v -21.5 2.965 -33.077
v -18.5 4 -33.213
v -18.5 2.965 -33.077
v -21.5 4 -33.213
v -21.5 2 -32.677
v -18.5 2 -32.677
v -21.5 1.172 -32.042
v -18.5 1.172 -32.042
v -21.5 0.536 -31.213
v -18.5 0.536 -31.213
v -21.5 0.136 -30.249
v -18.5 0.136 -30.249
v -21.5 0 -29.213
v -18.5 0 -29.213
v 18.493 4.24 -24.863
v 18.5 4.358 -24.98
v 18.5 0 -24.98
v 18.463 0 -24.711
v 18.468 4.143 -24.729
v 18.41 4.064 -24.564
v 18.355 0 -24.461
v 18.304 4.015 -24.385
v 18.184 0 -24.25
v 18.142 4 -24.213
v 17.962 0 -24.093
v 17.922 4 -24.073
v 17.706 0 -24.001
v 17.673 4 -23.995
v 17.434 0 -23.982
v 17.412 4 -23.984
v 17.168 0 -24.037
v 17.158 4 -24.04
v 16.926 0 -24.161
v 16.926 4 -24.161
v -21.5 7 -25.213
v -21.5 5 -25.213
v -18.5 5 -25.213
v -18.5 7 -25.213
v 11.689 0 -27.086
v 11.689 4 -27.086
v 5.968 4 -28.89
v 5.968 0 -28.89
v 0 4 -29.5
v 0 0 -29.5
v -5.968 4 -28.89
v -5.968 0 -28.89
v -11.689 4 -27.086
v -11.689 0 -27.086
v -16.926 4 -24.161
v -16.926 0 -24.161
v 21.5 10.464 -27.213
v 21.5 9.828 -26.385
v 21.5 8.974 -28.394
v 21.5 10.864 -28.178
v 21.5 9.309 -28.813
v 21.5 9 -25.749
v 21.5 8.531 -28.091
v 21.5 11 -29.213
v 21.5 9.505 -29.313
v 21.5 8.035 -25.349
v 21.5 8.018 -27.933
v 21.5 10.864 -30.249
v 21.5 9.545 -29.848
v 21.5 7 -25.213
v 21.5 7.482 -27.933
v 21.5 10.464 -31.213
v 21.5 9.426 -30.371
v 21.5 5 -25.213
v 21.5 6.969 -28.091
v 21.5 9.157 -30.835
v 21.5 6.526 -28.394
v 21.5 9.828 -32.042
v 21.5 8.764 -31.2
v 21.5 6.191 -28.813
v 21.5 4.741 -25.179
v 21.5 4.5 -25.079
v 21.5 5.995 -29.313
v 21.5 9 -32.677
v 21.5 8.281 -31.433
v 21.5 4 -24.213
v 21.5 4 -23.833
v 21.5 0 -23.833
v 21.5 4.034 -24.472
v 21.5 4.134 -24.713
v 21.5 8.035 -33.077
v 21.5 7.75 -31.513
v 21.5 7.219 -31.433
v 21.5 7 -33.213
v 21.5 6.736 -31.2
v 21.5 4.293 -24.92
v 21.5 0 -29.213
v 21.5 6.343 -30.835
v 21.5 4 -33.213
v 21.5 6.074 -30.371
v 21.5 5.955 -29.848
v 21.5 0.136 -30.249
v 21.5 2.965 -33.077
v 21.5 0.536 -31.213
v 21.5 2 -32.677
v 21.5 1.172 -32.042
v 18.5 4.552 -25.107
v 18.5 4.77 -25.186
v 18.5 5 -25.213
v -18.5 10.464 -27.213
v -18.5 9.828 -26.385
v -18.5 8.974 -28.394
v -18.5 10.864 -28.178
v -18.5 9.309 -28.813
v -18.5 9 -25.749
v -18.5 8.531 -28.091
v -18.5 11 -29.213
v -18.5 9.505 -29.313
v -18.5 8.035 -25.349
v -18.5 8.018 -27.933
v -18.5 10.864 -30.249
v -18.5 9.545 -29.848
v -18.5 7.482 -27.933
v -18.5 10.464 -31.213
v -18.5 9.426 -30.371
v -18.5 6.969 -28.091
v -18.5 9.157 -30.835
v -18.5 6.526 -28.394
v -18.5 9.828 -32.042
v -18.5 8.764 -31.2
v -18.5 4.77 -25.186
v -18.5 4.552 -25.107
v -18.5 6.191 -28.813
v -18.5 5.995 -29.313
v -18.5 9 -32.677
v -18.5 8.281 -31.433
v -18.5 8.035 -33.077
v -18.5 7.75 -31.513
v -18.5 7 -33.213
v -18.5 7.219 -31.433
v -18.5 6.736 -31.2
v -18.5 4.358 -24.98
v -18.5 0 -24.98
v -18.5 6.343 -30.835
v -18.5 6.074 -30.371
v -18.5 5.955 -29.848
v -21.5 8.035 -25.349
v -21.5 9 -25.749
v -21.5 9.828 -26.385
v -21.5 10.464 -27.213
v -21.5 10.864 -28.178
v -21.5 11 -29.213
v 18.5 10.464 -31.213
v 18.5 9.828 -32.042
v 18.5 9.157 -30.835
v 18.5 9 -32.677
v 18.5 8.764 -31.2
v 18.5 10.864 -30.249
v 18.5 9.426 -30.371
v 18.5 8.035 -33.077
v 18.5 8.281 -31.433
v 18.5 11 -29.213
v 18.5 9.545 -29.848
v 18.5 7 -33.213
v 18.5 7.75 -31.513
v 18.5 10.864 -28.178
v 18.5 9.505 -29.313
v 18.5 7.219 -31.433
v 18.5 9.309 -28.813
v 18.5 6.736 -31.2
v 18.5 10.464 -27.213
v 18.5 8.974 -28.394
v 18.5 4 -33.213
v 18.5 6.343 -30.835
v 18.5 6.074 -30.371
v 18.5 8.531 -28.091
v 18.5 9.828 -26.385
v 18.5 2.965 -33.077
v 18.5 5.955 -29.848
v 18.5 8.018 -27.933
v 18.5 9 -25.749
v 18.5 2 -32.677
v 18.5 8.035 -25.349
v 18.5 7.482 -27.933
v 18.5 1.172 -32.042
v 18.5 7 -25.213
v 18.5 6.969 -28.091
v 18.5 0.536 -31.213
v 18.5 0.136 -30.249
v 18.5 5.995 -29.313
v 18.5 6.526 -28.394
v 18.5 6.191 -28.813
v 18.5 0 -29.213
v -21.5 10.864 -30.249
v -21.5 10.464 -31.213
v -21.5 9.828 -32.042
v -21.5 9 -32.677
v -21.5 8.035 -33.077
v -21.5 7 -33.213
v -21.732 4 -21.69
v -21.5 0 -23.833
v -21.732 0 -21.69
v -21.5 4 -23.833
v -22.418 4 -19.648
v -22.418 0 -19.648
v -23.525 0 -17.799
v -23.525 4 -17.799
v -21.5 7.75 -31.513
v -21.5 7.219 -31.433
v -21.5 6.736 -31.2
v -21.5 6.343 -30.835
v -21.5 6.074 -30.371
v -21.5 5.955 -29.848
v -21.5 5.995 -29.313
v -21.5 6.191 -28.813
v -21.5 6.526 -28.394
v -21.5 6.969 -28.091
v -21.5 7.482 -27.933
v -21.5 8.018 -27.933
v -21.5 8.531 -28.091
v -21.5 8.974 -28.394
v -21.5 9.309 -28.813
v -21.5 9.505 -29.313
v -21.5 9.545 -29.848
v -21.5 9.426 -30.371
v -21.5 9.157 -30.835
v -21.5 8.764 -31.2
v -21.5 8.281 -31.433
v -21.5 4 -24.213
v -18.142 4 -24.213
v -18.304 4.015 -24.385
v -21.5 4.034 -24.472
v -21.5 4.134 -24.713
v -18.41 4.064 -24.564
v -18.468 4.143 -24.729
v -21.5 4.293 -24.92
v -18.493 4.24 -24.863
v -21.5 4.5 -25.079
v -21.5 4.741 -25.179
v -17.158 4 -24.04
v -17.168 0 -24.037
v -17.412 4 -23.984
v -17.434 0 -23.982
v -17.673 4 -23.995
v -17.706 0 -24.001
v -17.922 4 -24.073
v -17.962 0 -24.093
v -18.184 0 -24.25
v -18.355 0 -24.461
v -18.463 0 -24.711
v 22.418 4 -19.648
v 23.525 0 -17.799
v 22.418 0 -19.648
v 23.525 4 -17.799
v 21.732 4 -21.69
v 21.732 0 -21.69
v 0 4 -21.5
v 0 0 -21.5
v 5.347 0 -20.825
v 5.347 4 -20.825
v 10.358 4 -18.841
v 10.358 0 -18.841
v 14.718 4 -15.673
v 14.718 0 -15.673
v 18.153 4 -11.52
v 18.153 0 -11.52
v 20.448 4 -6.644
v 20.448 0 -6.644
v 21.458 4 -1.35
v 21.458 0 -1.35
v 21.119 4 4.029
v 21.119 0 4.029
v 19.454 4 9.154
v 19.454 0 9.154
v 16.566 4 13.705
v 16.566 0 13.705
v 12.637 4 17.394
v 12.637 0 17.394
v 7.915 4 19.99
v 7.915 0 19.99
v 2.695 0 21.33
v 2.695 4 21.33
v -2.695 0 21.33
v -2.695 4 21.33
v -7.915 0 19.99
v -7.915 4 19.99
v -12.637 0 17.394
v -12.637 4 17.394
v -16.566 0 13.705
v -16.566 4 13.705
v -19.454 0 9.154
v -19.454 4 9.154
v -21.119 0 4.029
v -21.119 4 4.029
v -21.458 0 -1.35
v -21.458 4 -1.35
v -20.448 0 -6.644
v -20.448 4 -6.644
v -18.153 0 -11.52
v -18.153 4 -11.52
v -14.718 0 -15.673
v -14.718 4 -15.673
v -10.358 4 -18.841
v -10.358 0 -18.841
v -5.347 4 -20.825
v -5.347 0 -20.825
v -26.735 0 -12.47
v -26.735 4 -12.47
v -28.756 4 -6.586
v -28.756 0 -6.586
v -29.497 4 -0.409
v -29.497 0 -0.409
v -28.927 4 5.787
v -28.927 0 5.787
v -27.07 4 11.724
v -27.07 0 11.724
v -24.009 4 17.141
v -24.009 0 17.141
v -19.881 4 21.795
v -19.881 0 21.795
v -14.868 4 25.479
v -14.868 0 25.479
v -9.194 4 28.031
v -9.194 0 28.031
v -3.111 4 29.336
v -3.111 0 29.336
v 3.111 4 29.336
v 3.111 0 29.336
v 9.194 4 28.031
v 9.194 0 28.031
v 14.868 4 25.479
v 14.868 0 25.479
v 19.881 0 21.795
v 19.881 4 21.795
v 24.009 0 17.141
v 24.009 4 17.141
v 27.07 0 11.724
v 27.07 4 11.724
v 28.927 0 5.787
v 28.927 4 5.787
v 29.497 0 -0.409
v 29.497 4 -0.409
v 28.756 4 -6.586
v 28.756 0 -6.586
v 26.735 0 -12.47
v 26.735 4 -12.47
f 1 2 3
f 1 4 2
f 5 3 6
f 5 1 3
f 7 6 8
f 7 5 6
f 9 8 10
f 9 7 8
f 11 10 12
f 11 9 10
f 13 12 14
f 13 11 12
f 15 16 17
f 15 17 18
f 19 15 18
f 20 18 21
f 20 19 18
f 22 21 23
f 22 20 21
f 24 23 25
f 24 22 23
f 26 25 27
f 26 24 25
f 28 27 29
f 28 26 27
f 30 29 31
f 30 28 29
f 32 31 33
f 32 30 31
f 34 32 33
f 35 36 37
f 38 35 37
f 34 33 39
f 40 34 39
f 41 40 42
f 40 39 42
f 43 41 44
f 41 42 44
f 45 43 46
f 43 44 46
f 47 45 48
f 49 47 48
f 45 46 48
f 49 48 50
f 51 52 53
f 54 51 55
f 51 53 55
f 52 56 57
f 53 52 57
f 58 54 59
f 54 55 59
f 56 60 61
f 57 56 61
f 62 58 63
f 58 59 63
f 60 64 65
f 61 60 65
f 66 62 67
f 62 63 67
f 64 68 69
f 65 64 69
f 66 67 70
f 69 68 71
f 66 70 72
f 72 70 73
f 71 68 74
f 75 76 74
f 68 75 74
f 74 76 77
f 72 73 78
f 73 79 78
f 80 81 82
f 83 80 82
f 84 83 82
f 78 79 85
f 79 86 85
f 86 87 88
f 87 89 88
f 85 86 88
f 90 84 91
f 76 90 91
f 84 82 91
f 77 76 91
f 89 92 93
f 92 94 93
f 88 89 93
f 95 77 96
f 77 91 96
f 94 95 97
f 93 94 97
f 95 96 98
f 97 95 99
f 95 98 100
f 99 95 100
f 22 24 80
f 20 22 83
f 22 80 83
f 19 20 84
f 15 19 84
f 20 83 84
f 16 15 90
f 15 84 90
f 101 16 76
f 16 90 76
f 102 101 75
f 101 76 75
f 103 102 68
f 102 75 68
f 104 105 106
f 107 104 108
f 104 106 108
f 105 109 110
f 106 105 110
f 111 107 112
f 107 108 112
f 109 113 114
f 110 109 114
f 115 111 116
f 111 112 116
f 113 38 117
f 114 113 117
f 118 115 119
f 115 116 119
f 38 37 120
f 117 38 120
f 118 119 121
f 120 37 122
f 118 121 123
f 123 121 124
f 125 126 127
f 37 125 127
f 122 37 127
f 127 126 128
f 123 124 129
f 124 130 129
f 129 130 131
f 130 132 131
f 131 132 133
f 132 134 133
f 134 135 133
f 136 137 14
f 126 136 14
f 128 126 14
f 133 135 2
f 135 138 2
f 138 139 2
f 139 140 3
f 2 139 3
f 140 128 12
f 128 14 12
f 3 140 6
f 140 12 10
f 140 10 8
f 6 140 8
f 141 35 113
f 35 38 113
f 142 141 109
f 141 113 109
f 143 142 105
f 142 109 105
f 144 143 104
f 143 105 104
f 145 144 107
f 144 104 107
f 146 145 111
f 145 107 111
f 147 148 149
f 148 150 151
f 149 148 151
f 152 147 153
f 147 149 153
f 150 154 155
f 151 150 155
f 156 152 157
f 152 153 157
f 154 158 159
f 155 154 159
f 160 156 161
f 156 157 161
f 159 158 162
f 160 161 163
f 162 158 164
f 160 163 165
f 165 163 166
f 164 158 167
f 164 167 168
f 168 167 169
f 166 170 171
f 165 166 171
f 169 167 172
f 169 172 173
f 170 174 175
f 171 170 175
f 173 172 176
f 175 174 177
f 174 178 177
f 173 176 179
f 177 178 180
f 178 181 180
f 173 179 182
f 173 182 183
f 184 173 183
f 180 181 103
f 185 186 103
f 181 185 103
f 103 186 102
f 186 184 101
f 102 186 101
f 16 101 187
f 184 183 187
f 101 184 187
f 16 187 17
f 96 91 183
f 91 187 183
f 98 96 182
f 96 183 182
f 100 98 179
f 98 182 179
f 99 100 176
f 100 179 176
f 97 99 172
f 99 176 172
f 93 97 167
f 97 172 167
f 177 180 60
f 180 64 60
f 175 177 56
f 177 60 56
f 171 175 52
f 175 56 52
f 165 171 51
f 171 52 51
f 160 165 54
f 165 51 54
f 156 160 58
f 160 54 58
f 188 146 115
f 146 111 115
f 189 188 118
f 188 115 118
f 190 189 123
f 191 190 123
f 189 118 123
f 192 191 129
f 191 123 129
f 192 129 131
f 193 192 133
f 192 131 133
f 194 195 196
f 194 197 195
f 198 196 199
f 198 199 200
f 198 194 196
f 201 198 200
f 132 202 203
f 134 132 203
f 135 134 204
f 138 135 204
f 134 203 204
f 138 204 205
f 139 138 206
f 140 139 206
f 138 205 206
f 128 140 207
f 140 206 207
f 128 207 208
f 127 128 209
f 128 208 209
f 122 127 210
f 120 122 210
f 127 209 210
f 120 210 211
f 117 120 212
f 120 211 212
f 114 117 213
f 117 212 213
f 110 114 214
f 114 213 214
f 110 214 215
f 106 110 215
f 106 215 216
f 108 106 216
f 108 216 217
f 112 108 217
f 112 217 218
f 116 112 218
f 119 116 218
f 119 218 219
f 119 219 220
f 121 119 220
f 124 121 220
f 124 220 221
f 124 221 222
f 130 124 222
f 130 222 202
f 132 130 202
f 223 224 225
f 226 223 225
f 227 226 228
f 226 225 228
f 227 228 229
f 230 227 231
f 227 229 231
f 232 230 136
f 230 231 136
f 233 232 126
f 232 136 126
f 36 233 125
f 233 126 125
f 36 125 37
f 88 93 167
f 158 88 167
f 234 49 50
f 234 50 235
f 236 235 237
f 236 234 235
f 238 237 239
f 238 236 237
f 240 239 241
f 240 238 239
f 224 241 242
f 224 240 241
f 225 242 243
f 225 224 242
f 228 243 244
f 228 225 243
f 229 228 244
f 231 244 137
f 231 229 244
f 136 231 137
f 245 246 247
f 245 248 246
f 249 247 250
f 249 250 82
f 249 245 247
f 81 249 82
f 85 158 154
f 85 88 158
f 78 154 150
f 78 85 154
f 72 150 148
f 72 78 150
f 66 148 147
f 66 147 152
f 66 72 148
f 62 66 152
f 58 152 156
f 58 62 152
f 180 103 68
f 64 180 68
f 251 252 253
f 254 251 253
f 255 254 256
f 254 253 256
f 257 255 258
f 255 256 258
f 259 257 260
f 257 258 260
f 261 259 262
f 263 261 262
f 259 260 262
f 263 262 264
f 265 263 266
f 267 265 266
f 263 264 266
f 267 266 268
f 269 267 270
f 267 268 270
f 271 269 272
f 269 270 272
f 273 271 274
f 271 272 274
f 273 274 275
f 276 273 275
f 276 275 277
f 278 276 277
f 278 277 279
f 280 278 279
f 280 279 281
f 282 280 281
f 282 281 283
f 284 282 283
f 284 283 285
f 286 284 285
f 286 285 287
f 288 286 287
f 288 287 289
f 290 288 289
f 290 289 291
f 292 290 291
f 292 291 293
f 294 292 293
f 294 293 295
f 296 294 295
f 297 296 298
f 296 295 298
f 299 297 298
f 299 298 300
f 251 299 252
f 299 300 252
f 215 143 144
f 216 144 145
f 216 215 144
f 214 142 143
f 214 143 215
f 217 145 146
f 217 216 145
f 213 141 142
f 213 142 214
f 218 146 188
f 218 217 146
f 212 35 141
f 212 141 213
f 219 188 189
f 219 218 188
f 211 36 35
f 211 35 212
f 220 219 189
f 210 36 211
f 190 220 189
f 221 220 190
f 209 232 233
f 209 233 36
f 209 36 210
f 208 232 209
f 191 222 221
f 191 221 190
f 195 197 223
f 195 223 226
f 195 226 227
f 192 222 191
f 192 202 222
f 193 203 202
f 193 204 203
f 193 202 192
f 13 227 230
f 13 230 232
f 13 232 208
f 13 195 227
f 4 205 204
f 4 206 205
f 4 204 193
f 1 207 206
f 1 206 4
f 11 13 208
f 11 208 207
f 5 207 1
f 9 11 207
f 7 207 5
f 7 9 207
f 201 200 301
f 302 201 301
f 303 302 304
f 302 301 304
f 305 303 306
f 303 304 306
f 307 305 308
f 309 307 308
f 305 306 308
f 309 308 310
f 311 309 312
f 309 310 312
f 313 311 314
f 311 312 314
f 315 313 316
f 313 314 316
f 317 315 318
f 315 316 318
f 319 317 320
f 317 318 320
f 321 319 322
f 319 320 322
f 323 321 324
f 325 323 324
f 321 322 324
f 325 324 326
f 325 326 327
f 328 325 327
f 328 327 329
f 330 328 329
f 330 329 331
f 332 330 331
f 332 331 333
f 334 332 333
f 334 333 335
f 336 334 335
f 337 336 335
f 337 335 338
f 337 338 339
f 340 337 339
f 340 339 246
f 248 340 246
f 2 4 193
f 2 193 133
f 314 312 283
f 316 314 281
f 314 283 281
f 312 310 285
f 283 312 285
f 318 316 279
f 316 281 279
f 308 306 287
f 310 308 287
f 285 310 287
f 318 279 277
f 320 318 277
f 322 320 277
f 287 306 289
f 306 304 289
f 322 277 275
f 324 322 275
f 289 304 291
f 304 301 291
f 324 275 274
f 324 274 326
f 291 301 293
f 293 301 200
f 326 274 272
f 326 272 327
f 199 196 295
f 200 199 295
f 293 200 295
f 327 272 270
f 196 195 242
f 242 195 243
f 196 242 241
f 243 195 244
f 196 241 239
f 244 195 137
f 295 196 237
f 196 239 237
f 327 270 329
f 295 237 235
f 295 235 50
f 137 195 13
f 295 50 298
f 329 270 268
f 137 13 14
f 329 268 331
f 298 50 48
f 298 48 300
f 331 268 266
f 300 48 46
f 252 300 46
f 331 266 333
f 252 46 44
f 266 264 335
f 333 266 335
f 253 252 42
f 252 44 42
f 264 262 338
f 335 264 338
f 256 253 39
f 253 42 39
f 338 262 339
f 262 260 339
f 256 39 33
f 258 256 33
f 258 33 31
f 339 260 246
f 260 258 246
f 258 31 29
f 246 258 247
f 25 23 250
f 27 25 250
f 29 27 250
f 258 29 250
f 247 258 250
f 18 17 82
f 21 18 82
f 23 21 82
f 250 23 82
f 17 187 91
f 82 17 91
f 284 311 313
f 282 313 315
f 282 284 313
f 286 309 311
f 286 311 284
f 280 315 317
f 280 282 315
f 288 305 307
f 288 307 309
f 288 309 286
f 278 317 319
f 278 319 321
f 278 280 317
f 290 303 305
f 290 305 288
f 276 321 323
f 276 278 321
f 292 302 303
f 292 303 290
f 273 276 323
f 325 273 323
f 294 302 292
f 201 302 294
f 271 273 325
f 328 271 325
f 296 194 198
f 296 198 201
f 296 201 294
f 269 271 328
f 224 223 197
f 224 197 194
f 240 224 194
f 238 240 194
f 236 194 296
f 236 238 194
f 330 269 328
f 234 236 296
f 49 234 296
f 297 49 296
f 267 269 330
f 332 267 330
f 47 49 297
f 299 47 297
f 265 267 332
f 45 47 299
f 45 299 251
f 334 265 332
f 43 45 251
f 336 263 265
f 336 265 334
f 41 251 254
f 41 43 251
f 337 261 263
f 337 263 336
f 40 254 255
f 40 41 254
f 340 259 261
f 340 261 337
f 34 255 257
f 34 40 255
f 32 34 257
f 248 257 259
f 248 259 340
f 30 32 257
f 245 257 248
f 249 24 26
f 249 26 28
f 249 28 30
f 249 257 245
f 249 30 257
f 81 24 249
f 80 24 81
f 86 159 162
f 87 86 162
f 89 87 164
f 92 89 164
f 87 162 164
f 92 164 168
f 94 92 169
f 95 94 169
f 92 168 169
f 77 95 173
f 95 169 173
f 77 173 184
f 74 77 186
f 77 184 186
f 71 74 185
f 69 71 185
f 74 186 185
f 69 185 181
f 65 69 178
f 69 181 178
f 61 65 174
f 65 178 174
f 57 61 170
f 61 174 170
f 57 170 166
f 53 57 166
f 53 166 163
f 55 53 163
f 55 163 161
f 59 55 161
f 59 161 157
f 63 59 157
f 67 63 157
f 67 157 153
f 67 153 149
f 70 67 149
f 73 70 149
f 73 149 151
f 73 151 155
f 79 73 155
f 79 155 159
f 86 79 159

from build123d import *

# Parameters (mm, degrees)
BOSS_EXTRUDE1_DEPTH = 4
SKETCH2_W           = 3
SKETCH2_H           = 8
BOSS_EXTRUDE2_DEPTH = 7
SKETCH3_R           = 1.8
CUT_EXTRUDE1_DEPTH  = 62.847529316
FILLET1_R           = 4
FILLET2_R           = 10
FILLET3_R           = 1
FILLET4_R           = 1
SKETCH4_R           = 21.5
CUT_EXTRUDE2_DEPTH  = 46.764253326


with BuildPart() as part:
    # Sketch1 → Boss-Extrude1 (new body)
    with BuildSketch(Plane(origin=(0, 0, 0), x_dir=(1, 0, 0), z_dir=(0, 1, 0))):
        with BuildLine():
            Line((18.5, 33.213203436), (18.5, 22.978250586))
            ThreePointArc((18.5, 22.978250586), (0, 29.5), (-18.5, 22.978250586))
            Line((-18.5, 22.978250586), (-18.5, 33.213203436))
            Line((-18.5, 33.213203436), (-21.5, 33.213203436))
            Line((-21.5, 33.213203436), (-21.5, 20.199009877))
            ThreePointArc((-21.5, 20.199009877), (0, -29.5), (21.5, 20.199009877))
            Line((21.5, 20.199009877), (21.5, 33.213203436))
            Line((21.5, 33.213203436), (18.5, 33.213203436))
        make_face()
    extrude(amount=BOSS_EXTRUDE1_DEPTH)

    # Sketch2 → Boss-Extrude2 (add)
    with BuildSketch(Plane(origin=(0, 4, 0), x_dir=(1, 0, 0), z_dir=(0, 1, 0))):
        with Locations((-20, 29.213203436)):
            Rectangle(SKETCH2_W, SKETCH2_H)
        with Locations((20, 29.213203436)):
            Rectangle(SKETCH2_W, SKETCH2_H)
    extrude(amount=BOSS_EXTRUDE2_DEPTH)

    # Sketch3 → Cut-Extrude1 (cut, through all)
    with BuildSketch(Plane.ZY.offset(21.5)):
        with Locations(Location((-29.713203436, 7.75, 0), (0, 0, 180))):
            Circle(SKETCH3_R)
    extrude(amount=-CUT_EXTRUDE1_DEPTH, mode=Mode.SUBTRACT)

    # Fillet1
    fillet1_edges = [part.edges().sort_by_distance(p)[0] for p in [
        (-20, 11, -25.213203436),
        (-20, 11, -33.213203436),
        (20, 11, -25.213203436),
        (20, 11, -33.213203436),
        (20, 0, -33.213203436),
        (-20, 0, -33.213203436),
    ]]
    fillet(fillet1_edges, radius=FILLET1_R - 0.0001)  # a hair under: the kernel refuses the full size

    # Fillet2
    fillet2_edges = [part.edges().sort_by_distance(p)[0] for p in [
        (21.5, 2, -20.199009877),
        (-21.5, 2, -20.199009877),
    ]]
    fillet(fillet2_edges, radius=FILLET2_R)

    # Fillet3
    fillet3_edges = [part.edges().sort_by_distance(p)[0] for p in [
        (18.5, 2, -22.978250586),
        (-18.5, 2, -22.978250586),
    ]]
    fillet(fillet3_edges, radius=FILLET3_R)

    # Fillet4
    fillet4_edges = [part.edges().sort_by_distance(p)[0] for p in [
        (-20, 4, -25.213203436),
        (20, 4, -25.213203436),
    ]]
    fillet(fillet4_edges, radius=FILLET4_R)

    # Sketch4 → Cut-Extrude2 (cut, through all)
    with BuildSketch(Plane.XZ):
        with Locations(Location((0, 0, 0), (0, 0, 270))):
            Circle(SKETCH4_R)
    extrude(amount=-CUT_EXTRUDE2_DEPTH, mode=Mode.SUBTRACT)


solid = part.part
